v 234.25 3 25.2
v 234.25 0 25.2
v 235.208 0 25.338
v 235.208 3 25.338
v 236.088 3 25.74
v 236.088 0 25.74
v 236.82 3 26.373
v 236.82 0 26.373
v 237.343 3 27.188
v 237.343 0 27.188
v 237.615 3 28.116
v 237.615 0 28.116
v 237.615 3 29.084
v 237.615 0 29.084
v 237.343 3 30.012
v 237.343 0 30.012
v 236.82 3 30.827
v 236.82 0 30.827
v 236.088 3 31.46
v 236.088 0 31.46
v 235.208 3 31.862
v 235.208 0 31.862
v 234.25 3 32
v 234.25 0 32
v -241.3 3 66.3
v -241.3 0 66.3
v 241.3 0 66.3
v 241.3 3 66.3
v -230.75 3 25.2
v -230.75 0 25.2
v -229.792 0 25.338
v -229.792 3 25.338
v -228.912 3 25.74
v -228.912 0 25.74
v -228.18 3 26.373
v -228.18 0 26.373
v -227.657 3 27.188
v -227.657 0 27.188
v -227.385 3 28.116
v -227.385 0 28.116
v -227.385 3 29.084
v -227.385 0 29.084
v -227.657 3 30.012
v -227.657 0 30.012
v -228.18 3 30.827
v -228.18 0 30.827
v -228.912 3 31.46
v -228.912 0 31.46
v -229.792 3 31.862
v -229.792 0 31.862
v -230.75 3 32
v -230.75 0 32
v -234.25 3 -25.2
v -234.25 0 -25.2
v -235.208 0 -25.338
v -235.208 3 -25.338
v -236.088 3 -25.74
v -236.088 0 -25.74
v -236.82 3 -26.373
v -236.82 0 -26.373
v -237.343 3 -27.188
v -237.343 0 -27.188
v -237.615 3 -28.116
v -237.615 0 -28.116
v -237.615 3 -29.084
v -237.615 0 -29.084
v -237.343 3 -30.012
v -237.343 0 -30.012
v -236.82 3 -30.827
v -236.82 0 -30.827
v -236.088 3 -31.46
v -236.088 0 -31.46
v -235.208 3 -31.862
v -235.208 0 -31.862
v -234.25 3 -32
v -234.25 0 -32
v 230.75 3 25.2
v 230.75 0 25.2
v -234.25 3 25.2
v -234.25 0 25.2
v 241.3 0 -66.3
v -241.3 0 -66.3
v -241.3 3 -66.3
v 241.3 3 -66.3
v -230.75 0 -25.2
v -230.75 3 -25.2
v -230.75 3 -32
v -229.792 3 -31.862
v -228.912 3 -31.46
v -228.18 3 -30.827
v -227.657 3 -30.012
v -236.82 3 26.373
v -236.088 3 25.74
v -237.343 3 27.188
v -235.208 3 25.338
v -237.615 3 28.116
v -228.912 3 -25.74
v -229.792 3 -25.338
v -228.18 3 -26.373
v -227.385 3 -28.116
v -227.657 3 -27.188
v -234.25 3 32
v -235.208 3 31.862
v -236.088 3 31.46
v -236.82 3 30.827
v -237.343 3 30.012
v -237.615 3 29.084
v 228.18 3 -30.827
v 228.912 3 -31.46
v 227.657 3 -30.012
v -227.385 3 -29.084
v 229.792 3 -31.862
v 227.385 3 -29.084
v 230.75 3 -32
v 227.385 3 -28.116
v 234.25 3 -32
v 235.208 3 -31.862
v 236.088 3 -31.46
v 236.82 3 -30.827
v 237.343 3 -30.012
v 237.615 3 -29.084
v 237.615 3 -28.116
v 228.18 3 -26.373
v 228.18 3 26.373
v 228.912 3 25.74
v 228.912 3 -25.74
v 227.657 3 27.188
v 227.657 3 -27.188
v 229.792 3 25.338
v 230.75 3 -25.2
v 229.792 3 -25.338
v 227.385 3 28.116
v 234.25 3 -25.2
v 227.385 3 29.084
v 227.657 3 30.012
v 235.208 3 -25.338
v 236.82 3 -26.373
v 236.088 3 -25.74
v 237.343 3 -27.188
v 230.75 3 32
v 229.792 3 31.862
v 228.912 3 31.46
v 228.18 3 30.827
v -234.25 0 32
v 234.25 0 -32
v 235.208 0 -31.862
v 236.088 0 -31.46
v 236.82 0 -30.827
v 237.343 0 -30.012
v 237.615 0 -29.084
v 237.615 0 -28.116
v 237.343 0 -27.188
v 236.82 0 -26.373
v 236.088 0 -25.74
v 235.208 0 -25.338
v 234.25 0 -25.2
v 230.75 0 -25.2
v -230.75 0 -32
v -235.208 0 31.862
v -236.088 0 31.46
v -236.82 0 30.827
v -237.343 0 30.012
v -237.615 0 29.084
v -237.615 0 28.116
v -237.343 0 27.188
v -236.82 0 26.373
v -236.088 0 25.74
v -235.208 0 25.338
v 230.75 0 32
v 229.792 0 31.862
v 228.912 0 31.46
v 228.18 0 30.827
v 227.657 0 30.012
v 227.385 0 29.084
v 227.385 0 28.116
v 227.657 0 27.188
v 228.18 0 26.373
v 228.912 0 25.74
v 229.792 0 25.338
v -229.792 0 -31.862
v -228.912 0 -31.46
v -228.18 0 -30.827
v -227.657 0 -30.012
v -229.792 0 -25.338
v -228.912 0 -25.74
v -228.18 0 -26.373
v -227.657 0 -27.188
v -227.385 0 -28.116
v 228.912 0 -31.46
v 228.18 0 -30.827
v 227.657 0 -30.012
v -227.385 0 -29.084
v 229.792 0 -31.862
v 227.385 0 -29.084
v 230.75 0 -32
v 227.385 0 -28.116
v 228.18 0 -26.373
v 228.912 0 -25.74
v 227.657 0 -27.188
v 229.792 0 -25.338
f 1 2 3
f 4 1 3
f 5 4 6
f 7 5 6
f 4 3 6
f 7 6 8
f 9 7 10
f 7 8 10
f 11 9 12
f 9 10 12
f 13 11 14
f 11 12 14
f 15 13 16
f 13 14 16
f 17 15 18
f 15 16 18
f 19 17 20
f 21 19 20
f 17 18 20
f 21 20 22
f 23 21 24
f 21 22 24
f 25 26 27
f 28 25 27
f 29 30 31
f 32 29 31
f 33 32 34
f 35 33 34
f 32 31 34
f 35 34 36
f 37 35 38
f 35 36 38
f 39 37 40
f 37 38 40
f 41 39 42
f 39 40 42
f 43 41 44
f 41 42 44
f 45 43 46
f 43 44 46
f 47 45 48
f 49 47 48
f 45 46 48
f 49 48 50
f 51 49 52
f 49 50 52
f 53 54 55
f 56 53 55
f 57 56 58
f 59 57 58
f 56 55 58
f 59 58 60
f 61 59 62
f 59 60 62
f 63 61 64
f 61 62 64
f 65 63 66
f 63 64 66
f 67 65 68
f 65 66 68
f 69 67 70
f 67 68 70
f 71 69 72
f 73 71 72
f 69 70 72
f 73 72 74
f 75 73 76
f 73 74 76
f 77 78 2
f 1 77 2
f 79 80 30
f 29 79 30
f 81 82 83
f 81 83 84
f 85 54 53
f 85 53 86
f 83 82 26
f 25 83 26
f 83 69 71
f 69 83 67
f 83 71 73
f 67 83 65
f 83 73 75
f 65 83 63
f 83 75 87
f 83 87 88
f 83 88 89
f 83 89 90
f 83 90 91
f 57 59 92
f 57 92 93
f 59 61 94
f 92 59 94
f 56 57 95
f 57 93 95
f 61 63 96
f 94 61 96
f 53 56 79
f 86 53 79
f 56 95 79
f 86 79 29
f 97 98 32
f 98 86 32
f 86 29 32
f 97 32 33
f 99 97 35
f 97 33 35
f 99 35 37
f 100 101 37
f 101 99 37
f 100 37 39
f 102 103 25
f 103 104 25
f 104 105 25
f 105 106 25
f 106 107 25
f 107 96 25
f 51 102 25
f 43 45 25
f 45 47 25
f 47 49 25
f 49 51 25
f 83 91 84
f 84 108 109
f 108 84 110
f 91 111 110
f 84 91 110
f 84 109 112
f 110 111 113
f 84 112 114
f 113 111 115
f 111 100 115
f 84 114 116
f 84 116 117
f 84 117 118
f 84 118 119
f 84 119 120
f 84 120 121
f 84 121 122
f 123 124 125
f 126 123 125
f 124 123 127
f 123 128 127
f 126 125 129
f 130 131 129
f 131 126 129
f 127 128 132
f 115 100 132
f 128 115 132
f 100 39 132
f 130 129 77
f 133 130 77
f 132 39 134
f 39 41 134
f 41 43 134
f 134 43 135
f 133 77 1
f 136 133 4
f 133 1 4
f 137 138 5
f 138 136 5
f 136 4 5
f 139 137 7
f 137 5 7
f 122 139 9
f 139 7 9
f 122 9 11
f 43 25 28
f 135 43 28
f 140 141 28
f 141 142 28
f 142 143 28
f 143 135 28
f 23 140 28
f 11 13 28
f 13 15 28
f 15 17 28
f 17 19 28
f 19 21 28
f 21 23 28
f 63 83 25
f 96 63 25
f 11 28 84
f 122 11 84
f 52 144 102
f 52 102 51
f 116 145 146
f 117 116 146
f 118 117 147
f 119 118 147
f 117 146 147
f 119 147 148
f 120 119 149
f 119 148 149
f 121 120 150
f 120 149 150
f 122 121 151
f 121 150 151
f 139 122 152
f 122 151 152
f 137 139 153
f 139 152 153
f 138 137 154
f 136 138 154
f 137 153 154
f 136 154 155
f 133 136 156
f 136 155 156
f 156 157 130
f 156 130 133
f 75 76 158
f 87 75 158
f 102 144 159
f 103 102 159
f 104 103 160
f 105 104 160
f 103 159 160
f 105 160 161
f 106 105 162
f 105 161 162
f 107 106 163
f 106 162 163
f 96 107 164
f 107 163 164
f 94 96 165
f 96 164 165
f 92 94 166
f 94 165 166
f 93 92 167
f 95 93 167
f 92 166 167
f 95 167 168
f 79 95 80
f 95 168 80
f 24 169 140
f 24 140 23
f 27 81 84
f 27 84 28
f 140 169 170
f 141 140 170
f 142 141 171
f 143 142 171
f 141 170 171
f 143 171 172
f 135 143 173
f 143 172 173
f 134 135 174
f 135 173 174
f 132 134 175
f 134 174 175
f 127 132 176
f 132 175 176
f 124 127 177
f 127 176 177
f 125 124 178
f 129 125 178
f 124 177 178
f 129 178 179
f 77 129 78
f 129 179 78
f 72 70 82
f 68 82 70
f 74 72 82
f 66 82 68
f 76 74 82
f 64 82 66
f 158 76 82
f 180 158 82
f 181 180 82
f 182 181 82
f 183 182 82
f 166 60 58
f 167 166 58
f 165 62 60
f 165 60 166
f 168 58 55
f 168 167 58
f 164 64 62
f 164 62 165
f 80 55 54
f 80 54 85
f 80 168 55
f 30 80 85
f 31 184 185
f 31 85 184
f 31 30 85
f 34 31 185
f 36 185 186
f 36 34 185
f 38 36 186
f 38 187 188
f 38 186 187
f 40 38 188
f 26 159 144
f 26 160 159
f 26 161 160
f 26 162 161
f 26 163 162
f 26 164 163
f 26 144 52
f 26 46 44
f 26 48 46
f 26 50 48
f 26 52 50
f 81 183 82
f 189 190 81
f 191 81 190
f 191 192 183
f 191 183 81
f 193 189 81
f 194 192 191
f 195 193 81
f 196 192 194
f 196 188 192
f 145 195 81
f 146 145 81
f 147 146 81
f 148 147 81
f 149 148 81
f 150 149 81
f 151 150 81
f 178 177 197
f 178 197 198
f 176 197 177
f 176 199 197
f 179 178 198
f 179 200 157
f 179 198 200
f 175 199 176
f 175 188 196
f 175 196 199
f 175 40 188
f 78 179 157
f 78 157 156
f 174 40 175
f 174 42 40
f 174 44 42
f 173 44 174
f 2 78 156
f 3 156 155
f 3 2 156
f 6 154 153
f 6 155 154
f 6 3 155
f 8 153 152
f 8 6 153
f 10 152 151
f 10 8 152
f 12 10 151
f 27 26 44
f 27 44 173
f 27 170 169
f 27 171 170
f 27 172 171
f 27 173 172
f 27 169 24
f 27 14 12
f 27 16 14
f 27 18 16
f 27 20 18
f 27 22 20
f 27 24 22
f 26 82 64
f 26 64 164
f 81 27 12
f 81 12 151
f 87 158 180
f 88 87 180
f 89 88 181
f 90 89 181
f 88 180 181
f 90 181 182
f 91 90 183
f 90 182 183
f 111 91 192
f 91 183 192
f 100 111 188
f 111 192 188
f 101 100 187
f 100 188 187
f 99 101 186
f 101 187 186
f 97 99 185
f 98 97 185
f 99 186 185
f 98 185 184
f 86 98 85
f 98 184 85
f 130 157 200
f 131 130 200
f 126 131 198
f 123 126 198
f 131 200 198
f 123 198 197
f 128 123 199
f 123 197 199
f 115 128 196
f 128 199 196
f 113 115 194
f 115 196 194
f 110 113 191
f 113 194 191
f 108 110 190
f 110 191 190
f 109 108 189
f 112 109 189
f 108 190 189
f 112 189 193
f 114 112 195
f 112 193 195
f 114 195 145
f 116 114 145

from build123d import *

# Parameters (mm, degrees)
F0_W     = 482.6
F0_H     = 132.6
F1_DEPTH = 3
F2_W     = 3.5
F2_H     = 6.8
F3_W     = 3.5
F3_H     = 6.8
F4_W     = 3.5
F4_H     = 6.8
F5_W     = 3.5
F5_H     = 6.8
F6_DEPTH = 3


with BuildPart() as f1:
    # F0 (on Front) → F1 (new body)
    with BuildSketch(Plane.XZ):
        Rectangle(F0_W, F0_H)
    extrude(amount=-F1_DEPTH)

    # F2 (on face) + F3 (on face) + F4 (on face) + F5 (on face) → F6 (cut)
    with BuildSketch(Plane.XZ):
        with Locations((-232.5, 28.6)):
            Rectangle(F2_W, F2_H)
        with BuildLine():
            Line((-230.75, 32), (-230.75, 25.2))
            ThreePointArc((-230.75, 25.2), (-227.35, 28.6), (-230.75, 32))
        make_face()
        with BuildLine():
            ThreePointArc((-234.25, 32), (-237.65, 28.6), (-234.25, 25.2))
            Line((-234.25, 25.2), (-234.25, 32))
        make_face()
    with BuildSketch(Plane.XZ):
        with Locations((-232.5, -28.6)):
            Rectangle(F3_W, F3_H)
        with BuildLine():
            Line((-230.75, -25.2), (-230.75, -32))
            ThreePointArc((-230.75, -32), (-227.35, -28.6), (-230.75, -25.2))
        make_face()
        with BuildLine():
            ThreePointArc((-234.25, -25.2), (-237.65, -28.6), (-234.25, -32))
            Line((-234.25, -32), (-234.25, -25.2))
        make_face()
    with BuildSketch(Plane.XZ):
        with Locations((232.5, 28.6)):
            Rectangle(F4_W, F4_H)
        with BuildLine():
            ThreePointArc((234.25, 25.2), (237.65, 28.6), (234.25, 32))
            Line((234.25, 32), (234.25, 25.2))
        make_face()
        with BuildLine():
            Line((230.75, 25.2), (230.75, 32))
            ThreePointArc((230.75, 32), (227.35, 28.6), (230.75, 25.2))
        make_face()
    with BuildSketch(Plane.XZ):
        with Locations((232.5, -28.6)):
            Rectangle(F5_W, F5_H)
        with BuildLine():
            Line((234.25, -25.2), (234.25, -32))
            ThreePointArc((234.25, -32), (237.65, -28.6), (234.25, -25.2))
        make_face()
        with BuildLine():
            ThreePointArc((230.75, -25.2), (227.35, -28.6), (230.75, -32))
            Line((230.75, -32), (230.75, -25.2))
        make_face()
    extrude(amount=-F6_DEPTH, mode=Mode.SUBTRACT)


solid = f1.part
